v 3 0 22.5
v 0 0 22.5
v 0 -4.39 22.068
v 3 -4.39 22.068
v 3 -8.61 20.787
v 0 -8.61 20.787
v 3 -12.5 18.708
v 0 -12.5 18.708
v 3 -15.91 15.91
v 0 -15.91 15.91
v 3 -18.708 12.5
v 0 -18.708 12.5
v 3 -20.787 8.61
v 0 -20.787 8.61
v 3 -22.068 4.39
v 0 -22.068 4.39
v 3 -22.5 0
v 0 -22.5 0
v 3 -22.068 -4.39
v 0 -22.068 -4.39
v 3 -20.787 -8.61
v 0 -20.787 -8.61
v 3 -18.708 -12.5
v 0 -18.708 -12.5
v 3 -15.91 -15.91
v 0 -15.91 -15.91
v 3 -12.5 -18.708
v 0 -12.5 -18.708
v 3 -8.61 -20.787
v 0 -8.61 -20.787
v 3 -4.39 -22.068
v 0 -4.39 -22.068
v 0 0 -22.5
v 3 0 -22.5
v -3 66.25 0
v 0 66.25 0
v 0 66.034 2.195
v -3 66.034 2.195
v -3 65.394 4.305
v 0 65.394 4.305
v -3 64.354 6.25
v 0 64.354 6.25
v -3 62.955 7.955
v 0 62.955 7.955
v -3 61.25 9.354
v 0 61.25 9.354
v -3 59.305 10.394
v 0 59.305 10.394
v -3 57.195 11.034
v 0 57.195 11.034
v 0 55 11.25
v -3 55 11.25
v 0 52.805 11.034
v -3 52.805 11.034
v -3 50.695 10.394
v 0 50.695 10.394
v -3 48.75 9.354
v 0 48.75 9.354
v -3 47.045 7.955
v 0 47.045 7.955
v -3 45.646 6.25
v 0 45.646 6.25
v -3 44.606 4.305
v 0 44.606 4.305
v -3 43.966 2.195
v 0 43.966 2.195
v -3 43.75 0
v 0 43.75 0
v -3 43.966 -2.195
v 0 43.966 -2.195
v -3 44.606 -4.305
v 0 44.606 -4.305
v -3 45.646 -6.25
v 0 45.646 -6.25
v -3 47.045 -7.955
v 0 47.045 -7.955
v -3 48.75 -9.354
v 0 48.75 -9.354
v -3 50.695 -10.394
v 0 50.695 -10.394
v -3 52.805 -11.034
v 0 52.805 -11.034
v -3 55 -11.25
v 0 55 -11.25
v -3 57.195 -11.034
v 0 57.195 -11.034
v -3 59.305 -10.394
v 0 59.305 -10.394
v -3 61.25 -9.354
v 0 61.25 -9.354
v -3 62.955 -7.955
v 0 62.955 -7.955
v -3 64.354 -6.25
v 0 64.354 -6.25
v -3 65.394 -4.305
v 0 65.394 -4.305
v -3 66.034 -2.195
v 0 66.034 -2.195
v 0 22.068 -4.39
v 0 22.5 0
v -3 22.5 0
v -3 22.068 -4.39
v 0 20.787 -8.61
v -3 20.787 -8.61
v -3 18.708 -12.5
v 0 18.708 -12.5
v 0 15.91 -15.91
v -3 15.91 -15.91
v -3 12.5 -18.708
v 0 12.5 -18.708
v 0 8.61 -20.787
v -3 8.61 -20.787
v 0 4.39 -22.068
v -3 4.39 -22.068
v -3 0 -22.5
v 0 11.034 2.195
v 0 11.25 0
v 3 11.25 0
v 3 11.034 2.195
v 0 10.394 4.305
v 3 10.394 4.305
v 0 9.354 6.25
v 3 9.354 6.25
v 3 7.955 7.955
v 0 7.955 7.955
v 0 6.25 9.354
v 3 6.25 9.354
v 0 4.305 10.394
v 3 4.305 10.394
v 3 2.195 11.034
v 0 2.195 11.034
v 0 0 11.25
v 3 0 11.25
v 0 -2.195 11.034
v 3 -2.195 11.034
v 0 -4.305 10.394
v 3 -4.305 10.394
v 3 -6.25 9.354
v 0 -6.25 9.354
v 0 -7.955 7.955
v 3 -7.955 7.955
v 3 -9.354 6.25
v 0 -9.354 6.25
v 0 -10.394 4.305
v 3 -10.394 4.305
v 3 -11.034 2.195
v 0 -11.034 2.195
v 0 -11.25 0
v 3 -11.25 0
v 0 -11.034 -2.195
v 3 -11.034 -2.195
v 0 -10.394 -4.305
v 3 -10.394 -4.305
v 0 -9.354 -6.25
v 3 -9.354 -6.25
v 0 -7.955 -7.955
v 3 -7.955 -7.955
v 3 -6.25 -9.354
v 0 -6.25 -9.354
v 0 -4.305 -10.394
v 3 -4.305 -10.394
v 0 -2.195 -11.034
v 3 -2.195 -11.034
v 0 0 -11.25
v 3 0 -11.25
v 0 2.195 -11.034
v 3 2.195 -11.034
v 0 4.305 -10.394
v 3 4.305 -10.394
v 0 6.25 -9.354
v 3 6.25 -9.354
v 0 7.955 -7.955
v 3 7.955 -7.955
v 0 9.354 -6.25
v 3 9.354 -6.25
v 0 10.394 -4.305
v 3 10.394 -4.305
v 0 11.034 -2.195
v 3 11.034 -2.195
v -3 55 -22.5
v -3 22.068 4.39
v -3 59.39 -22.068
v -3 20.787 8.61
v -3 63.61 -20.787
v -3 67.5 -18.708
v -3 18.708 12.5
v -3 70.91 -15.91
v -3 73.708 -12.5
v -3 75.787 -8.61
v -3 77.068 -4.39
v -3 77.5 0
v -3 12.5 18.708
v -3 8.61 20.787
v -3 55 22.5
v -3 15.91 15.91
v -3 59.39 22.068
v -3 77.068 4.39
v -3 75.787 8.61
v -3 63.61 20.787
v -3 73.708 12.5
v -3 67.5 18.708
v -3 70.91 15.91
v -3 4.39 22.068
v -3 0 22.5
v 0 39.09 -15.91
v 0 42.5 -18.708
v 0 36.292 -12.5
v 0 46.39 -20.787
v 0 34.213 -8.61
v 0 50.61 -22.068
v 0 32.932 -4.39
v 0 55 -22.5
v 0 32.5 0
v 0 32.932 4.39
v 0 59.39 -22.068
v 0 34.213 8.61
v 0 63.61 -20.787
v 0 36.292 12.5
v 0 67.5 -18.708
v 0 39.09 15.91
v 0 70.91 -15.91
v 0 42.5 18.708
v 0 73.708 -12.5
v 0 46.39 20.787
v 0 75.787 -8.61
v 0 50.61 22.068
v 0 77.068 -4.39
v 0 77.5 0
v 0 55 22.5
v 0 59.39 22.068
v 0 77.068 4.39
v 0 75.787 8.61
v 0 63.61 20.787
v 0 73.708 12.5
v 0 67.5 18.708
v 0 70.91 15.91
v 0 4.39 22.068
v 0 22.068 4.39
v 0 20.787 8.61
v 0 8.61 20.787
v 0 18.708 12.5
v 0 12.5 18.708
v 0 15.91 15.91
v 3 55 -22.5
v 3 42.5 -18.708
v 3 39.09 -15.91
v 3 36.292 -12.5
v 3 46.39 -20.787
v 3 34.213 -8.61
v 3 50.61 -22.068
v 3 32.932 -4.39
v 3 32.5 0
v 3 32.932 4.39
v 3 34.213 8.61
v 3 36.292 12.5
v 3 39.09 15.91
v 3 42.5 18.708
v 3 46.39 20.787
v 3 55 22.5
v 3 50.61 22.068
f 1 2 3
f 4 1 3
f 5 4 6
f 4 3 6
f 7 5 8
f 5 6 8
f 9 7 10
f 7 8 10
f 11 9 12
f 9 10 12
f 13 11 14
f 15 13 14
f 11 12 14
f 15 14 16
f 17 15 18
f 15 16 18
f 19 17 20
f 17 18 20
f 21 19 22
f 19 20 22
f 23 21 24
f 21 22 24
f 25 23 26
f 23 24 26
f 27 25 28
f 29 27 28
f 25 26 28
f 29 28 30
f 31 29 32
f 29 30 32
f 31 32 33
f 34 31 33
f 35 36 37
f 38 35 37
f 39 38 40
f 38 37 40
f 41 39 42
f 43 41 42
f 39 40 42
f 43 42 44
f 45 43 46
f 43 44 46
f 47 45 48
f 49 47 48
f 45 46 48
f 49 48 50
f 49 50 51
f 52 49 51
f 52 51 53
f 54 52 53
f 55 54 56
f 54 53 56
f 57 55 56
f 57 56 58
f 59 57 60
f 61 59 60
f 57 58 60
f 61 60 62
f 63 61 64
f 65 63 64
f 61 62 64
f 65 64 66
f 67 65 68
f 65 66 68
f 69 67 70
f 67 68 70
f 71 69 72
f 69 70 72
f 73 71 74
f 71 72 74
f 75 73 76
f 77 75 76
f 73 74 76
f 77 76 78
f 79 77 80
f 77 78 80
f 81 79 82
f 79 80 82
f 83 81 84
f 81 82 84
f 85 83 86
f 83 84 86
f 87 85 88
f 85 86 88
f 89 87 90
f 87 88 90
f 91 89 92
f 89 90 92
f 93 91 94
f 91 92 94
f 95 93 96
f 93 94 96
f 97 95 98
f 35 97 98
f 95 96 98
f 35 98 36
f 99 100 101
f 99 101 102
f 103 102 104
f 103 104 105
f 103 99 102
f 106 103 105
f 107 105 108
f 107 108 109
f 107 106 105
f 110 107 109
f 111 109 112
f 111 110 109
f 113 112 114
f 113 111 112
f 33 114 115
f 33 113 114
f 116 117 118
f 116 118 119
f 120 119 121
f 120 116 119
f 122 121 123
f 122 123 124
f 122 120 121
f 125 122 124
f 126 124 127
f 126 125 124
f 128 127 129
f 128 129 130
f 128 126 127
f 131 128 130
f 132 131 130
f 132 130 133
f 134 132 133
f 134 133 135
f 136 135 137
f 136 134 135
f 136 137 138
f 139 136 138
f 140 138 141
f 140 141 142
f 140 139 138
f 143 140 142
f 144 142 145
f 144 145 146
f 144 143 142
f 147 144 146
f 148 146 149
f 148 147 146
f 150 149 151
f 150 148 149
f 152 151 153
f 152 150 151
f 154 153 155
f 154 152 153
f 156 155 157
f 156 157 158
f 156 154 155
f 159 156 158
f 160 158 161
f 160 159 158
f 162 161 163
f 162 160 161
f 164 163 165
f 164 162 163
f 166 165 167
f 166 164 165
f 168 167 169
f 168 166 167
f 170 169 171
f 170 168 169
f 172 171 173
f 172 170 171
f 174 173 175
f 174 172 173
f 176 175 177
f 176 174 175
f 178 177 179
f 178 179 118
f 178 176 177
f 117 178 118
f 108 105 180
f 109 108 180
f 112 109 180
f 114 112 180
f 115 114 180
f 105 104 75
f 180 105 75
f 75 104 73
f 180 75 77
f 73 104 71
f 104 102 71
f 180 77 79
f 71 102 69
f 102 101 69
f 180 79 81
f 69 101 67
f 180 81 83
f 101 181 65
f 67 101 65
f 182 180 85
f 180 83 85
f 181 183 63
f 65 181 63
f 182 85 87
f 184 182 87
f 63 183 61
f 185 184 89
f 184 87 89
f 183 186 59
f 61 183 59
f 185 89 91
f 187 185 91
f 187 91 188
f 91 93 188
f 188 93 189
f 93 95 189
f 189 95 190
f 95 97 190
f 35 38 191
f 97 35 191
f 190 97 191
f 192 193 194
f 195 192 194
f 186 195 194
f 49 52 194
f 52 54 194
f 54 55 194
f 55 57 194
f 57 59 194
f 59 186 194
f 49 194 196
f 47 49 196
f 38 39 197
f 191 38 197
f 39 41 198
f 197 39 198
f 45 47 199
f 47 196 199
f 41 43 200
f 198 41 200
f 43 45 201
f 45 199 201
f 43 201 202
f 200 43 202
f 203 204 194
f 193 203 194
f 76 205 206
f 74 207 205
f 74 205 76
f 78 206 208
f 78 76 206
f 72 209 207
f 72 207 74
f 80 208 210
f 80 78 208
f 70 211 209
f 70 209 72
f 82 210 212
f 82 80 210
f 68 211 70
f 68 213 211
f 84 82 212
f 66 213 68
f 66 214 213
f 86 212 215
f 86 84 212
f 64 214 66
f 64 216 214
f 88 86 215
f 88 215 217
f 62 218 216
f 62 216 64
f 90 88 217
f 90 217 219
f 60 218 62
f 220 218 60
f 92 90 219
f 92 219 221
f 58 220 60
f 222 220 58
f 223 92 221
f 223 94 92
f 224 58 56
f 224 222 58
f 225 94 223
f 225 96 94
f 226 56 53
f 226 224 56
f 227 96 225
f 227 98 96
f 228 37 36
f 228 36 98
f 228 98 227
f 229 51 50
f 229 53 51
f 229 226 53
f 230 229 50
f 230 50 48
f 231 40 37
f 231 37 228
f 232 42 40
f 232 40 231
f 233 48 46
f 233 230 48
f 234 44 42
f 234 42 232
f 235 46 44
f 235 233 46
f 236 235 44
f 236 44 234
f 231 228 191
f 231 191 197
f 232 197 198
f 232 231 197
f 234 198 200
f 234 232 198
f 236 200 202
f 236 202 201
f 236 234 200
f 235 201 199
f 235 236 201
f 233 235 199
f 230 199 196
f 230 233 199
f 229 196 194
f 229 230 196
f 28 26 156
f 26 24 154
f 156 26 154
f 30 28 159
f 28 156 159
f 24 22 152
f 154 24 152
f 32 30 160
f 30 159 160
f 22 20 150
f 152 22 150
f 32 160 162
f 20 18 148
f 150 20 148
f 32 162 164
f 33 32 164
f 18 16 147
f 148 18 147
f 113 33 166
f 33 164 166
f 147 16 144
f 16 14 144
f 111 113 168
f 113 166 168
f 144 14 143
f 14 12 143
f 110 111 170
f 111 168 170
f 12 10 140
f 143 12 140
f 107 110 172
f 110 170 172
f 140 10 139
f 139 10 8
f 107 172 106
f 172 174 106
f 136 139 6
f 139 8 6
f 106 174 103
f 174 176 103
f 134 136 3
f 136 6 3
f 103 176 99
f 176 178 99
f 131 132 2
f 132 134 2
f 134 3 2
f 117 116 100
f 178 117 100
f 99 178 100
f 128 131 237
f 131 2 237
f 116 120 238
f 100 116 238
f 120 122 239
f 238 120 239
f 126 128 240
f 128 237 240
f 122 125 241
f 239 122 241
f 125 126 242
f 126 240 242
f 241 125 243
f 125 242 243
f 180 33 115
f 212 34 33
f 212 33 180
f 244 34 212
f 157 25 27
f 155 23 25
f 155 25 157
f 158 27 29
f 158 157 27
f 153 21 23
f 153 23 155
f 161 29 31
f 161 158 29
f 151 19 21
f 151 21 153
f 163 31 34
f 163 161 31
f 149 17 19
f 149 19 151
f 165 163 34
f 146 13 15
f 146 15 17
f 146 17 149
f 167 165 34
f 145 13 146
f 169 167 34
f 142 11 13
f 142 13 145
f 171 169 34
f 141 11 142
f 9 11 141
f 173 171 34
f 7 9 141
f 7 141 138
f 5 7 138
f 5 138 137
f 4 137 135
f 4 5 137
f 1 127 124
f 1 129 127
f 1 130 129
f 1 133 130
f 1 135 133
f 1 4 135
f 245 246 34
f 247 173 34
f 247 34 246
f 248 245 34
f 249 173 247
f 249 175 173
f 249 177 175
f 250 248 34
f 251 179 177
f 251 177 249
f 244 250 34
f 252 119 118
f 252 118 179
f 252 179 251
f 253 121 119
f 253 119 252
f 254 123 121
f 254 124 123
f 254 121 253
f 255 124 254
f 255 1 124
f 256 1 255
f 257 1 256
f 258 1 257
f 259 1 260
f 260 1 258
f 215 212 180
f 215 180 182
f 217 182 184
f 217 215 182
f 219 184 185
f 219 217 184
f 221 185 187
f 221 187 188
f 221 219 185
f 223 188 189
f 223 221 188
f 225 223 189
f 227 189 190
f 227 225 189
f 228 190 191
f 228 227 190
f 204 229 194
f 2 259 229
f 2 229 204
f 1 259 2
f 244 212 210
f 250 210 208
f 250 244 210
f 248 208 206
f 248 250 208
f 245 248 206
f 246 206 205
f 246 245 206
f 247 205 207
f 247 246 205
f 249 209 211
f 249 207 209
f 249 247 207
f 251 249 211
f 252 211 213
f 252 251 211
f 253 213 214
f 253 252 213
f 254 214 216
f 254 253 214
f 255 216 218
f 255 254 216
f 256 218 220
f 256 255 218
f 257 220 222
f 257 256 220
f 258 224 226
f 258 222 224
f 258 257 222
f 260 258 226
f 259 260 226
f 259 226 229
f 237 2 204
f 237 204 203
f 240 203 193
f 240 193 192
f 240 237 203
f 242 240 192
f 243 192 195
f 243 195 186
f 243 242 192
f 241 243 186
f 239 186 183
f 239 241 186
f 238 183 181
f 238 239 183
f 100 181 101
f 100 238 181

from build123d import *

# Parameters (mm, degrees)
F1_DEPTH      = 3
F1_DEPTH_BACK = 3
F0_R          = 11.25
F2_DEPTH      = 3
F3_DEPTH      = 3


with BuildPart() as f1:
    # F0 (on Right) → F1 (new body, two sides)
    with BuildSketch(Plane.YZ) as f1_sk:
        with BuildLine():
            ThreePointArc((0, 22.5), (15.909903, 15.909903), (22.5, 0))
            ThreePointArc((22.5, 0), (15.909903, -15.909903), (0, -22.5))
            Line((0, -22.5), (55, -22.5))
            ThreePointArc((55, -22.5), (32.5, 0), (55, 22.5))
            Line((55, 22.5), (0, 22.5))
        make_face()
    extrude(amount=F1_DEPTH)
    extrude(f1_sk.sketch, amount=-F1_DEPTH_BACK)

    # F0 (on Right) → F2 (join)
    with BuildSketch(Plane.YZ):
        with BuildLine():
            ThreePointArc((0, -22.5), (15.909903, -15.909903), (22.5, 0))
            ThreePointArc((22.5, 0), (15.909903, 15.909903), (0, 22.5))
            ThreePointArc((0, 22.5), (-22.5, 0), (0, -22.5))
        make_face()
        Circle(F0_R, mode=Mode.SUBTRACT)
    extrude(amount=F2_DEPTH)

    # F0 (on Right) → F3 (join)
    with BuildSketch(Plane.YZ):
        with BuildLine():
            ThreePointArc((77.5, 0), (70.909903, 15.909903), (55, 22.5))
            ThreePointArc((55, 22.5), (32.5, 0), (55, -22.5))
            ThreePointArc((55, -22.5), (70.909903, -15.909903), (77.5, 0))
        make_face()
        with Locations((55, 0)):
            Circle(F0_R, mode=Mode.SUBTRACT)
    extrude(amount=-F3_DEPTH)


solid = f1.part
